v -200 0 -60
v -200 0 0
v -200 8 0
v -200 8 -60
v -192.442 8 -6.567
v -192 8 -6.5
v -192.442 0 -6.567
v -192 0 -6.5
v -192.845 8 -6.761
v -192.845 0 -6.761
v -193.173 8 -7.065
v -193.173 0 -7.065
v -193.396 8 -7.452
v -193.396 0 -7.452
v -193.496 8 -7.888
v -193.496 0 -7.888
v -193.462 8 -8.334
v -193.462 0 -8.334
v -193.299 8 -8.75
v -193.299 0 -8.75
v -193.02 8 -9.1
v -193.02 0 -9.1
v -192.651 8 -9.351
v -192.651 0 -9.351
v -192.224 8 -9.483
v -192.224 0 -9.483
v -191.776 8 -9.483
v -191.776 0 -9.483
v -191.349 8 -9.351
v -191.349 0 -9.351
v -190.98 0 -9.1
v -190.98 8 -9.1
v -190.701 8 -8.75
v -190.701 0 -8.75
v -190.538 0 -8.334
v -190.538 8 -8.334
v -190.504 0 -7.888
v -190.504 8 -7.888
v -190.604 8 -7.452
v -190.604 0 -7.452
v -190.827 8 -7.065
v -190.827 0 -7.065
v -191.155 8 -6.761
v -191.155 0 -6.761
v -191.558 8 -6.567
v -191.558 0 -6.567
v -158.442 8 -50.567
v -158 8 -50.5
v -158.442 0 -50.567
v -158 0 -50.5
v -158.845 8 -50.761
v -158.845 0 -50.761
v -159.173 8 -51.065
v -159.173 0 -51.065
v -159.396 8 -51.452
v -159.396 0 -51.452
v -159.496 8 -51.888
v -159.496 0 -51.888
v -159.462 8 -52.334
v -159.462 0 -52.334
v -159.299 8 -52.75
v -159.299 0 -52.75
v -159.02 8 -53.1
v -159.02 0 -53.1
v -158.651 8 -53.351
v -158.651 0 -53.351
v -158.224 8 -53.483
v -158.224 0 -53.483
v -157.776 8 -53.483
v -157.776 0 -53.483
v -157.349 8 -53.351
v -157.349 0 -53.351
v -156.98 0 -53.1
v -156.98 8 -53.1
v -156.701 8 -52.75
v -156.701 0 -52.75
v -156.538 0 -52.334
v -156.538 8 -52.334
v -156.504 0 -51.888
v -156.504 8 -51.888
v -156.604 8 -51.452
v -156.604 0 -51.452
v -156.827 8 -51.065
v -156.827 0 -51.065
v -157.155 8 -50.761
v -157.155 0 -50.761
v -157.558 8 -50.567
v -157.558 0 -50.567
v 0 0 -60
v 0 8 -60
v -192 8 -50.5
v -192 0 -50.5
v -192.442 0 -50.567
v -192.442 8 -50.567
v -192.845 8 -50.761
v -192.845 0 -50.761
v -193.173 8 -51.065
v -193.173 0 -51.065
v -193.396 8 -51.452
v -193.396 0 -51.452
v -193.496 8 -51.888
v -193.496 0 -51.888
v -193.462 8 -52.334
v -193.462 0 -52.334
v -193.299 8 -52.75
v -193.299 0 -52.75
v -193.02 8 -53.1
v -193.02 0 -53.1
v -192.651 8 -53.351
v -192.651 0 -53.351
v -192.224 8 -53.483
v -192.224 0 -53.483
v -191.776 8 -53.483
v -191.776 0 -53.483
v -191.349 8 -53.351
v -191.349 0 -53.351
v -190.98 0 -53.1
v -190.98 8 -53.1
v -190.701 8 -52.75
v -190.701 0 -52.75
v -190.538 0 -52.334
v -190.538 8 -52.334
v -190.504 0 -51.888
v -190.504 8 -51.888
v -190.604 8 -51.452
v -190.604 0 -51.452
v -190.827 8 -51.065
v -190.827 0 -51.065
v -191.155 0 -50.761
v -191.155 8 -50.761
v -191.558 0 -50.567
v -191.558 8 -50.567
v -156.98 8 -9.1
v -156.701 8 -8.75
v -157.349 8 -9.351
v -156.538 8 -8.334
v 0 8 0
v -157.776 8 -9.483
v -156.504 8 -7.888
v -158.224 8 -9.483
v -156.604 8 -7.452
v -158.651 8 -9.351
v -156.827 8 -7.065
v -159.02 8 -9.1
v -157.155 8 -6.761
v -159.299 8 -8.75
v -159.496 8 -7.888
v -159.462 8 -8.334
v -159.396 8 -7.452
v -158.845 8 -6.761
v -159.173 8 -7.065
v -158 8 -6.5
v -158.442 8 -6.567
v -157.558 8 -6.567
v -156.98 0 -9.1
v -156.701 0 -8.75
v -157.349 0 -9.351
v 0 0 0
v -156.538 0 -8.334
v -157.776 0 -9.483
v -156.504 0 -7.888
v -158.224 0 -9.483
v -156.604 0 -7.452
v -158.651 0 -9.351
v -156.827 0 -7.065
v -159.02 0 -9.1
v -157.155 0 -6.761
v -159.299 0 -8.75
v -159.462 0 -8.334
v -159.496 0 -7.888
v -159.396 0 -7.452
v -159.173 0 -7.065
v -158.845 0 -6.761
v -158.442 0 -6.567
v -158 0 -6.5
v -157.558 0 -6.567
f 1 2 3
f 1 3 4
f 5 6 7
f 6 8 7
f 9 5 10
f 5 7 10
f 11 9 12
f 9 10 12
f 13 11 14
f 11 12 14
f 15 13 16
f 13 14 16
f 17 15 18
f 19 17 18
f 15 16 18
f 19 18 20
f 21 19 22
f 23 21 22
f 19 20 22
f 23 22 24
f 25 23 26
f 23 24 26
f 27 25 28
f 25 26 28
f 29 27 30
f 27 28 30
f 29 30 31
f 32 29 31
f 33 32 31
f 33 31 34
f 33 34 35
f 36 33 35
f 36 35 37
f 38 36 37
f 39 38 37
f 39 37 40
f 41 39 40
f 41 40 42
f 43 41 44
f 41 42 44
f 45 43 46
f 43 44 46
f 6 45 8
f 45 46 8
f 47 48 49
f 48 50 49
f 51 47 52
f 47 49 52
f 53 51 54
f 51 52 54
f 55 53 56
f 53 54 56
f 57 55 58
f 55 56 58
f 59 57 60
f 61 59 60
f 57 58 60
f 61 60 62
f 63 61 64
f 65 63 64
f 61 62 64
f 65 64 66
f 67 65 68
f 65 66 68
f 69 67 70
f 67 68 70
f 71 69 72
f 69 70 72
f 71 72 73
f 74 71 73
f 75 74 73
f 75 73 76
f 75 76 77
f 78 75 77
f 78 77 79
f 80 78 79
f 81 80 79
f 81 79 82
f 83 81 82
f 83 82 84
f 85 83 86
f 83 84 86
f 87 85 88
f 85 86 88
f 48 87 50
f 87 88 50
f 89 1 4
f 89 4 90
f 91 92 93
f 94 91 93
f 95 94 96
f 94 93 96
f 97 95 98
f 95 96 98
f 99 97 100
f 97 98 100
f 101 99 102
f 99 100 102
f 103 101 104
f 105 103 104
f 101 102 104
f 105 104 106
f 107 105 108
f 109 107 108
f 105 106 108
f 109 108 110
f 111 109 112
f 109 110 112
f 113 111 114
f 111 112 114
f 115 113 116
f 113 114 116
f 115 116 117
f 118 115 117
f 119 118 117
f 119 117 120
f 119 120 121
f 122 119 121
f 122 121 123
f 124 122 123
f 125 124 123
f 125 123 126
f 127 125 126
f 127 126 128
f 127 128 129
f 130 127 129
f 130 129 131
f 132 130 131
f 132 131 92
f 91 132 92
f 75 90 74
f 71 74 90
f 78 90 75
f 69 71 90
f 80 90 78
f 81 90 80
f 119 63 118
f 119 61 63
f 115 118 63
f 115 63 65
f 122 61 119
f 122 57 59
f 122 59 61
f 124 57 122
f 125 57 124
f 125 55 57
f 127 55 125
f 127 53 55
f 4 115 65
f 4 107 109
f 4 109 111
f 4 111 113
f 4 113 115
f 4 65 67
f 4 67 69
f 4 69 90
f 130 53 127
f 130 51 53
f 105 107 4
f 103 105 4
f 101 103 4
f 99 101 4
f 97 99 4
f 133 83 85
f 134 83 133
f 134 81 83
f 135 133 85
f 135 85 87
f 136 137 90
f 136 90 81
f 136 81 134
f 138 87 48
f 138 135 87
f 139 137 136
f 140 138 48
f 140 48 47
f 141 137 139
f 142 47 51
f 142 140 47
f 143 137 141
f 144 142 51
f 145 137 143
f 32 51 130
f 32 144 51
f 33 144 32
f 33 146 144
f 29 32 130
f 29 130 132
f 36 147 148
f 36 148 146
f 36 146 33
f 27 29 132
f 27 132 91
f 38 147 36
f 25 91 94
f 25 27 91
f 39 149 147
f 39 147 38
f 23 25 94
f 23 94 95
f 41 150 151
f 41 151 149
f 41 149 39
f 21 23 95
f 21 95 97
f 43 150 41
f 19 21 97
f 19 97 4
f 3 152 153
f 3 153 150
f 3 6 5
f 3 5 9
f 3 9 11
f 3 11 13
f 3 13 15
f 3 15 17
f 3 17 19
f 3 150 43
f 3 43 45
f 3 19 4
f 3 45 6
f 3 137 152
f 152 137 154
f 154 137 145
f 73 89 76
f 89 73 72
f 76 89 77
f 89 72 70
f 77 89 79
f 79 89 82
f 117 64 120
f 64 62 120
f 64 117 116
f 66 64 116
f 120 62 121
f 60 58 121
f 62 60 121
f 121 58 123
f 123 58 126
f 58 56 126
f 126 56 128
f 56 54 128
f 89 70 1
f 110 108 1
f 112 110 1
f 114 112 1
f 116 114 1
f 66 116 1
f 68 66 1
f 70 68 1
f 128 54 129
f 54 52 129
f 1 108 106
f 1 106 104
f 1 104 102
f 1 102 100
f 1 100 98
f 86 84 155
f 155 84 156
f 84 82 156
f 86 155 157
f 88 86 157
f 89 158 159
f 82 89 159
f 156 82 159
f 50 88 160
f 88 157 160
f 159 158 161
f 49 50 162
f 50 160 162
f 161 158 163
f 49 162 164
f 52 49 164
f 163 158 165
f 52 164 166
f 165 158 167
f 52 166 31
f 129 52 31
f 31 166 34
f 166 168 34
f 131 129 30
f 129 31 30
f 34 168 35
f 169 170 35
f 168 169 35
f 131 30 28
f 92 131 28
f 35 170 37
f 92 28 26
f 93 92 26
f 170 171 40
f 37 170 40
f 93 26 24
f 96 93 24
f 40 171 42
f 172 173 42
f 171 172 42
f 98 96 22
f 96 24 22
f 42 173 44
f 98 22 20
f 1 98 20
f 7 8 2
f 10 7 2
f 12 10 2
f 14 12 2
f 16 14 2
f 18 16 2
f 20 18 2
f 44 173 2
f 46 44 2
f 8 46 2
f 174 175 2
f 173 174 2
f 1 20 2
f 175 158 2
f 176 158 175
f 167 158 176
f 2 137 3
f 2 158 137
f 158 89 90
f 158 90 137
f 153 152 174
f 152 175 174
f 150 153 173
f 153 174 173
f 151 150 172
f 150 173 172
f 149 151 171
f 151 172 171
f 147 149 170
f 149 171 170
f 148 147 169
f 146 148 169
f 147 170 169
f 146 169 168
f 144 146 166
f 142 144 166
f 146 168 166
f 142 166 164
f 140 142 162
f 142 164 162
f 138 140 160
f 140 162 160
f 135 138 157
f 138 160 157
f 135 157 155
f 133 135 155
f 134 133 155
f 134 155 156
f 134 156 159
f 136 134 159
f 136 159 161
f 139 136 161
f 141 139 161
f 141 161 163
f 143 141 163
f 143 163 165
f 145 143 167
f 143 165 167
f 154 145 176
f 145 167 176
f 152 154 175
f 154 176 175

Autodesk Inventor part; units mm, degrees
ref_plane "YZ Plane" through (0, 0, 0) normal (1, 0, 0) x (0, 1, 0)
ref_plane "XZ Plane" through (0, 0, 0) normal (0, 1, 0) x (-1, 0, 0)
ref_plane "XY Plane" through (0, 0, 0) normal (0, 0, 1) x (1, 0, 0)
sketch "Sketch1" plane through (0, 0, 0) normal (0, 1, 0) x (-1, 0, 0)
  line L0 (0, 0) -> (200, 0)
  line L1 (200, 0) -> (200, -60)
  line L2 (200, -60) -> (0, -60)
  line L3 (0, -60) -> (0, 0)
  dimension "d0" = 200
  dimension "d1" = 60
extrude "Extrusion1" add sketch "Sketch1" along normal blind 8
sketch "Sketch2" plane through (0, 8, 0) normal (0, 1, 0) x (1, 0, 0)
  line L0 (-155, 55) -> (-155, 5)
  line L1 (-160, 17.25) -> (-160, 25.75)
  line L2 (-160, 25.75) -> (-161, 25.75)
  line L3 (-161, 25.75) -> (-161, 17.25)
  line L4 (-161, 17.25) -> (-160, 17.25)
  line L5 (-161, 34.25) -> (-160, 34.25)
  line L6 (-160, 34.25) -> (-160, 42.75)
  line L7 (-160, 42.75) -> (-161, 42.75)
  line L8 (-161, 42.75) -> (-161, 34.25)
  line L9 (-155, 55) -> (-195, 55)
  line L10 (-195, 5) -> (-155, 5)
  line L11 (-127.49, 30) -> (-133.3125, 30) construction
  line L12 (-195, 5) -> (-195, 55)
  circle A0 centre (-158, 52) radius 1.5
  circle A1 centre (-192, 52) radius 1.5
  circle A2 centre (-158, 8) radius 1.5
  circle A3 centre (-192, 8) radius 1.5
  line L13 (-200, 60) -> (-200, 0) projected
  line L14 (-200, 0) -> (0, 0) projected
  point P0 (-159.5, 47)
  point P1 (-159.5, 30)
  point P2 (-159.5, 13)
  dimension "d4" = 8.5
  dimension "d5" = 1
  dimension "d6" = 5
  dimension "d7" = 17
  dimension "d8" = 17
  dimension "d9" = 4.25
  dimension "d10" = 4.25
  dimension "d11" = 4.5
  dimension "d12" = 40
  dimension "d13" = 50
  dimension "d14" = 3
  dimension "d15" = 3
  dimension "d16" = 3
  dimension "d17" = 3
  dimension "d18" = 3
  dimension "d19" = 5
  dimension "d20" = 5
hole "Hole1" at (-158, 8, -8) at (-158, 8, -52) at (-192, 8, -52) at (-192, 8, -8) direction (0, -1, 0) diameter 3 end through all
properties part number "Luna_base"
